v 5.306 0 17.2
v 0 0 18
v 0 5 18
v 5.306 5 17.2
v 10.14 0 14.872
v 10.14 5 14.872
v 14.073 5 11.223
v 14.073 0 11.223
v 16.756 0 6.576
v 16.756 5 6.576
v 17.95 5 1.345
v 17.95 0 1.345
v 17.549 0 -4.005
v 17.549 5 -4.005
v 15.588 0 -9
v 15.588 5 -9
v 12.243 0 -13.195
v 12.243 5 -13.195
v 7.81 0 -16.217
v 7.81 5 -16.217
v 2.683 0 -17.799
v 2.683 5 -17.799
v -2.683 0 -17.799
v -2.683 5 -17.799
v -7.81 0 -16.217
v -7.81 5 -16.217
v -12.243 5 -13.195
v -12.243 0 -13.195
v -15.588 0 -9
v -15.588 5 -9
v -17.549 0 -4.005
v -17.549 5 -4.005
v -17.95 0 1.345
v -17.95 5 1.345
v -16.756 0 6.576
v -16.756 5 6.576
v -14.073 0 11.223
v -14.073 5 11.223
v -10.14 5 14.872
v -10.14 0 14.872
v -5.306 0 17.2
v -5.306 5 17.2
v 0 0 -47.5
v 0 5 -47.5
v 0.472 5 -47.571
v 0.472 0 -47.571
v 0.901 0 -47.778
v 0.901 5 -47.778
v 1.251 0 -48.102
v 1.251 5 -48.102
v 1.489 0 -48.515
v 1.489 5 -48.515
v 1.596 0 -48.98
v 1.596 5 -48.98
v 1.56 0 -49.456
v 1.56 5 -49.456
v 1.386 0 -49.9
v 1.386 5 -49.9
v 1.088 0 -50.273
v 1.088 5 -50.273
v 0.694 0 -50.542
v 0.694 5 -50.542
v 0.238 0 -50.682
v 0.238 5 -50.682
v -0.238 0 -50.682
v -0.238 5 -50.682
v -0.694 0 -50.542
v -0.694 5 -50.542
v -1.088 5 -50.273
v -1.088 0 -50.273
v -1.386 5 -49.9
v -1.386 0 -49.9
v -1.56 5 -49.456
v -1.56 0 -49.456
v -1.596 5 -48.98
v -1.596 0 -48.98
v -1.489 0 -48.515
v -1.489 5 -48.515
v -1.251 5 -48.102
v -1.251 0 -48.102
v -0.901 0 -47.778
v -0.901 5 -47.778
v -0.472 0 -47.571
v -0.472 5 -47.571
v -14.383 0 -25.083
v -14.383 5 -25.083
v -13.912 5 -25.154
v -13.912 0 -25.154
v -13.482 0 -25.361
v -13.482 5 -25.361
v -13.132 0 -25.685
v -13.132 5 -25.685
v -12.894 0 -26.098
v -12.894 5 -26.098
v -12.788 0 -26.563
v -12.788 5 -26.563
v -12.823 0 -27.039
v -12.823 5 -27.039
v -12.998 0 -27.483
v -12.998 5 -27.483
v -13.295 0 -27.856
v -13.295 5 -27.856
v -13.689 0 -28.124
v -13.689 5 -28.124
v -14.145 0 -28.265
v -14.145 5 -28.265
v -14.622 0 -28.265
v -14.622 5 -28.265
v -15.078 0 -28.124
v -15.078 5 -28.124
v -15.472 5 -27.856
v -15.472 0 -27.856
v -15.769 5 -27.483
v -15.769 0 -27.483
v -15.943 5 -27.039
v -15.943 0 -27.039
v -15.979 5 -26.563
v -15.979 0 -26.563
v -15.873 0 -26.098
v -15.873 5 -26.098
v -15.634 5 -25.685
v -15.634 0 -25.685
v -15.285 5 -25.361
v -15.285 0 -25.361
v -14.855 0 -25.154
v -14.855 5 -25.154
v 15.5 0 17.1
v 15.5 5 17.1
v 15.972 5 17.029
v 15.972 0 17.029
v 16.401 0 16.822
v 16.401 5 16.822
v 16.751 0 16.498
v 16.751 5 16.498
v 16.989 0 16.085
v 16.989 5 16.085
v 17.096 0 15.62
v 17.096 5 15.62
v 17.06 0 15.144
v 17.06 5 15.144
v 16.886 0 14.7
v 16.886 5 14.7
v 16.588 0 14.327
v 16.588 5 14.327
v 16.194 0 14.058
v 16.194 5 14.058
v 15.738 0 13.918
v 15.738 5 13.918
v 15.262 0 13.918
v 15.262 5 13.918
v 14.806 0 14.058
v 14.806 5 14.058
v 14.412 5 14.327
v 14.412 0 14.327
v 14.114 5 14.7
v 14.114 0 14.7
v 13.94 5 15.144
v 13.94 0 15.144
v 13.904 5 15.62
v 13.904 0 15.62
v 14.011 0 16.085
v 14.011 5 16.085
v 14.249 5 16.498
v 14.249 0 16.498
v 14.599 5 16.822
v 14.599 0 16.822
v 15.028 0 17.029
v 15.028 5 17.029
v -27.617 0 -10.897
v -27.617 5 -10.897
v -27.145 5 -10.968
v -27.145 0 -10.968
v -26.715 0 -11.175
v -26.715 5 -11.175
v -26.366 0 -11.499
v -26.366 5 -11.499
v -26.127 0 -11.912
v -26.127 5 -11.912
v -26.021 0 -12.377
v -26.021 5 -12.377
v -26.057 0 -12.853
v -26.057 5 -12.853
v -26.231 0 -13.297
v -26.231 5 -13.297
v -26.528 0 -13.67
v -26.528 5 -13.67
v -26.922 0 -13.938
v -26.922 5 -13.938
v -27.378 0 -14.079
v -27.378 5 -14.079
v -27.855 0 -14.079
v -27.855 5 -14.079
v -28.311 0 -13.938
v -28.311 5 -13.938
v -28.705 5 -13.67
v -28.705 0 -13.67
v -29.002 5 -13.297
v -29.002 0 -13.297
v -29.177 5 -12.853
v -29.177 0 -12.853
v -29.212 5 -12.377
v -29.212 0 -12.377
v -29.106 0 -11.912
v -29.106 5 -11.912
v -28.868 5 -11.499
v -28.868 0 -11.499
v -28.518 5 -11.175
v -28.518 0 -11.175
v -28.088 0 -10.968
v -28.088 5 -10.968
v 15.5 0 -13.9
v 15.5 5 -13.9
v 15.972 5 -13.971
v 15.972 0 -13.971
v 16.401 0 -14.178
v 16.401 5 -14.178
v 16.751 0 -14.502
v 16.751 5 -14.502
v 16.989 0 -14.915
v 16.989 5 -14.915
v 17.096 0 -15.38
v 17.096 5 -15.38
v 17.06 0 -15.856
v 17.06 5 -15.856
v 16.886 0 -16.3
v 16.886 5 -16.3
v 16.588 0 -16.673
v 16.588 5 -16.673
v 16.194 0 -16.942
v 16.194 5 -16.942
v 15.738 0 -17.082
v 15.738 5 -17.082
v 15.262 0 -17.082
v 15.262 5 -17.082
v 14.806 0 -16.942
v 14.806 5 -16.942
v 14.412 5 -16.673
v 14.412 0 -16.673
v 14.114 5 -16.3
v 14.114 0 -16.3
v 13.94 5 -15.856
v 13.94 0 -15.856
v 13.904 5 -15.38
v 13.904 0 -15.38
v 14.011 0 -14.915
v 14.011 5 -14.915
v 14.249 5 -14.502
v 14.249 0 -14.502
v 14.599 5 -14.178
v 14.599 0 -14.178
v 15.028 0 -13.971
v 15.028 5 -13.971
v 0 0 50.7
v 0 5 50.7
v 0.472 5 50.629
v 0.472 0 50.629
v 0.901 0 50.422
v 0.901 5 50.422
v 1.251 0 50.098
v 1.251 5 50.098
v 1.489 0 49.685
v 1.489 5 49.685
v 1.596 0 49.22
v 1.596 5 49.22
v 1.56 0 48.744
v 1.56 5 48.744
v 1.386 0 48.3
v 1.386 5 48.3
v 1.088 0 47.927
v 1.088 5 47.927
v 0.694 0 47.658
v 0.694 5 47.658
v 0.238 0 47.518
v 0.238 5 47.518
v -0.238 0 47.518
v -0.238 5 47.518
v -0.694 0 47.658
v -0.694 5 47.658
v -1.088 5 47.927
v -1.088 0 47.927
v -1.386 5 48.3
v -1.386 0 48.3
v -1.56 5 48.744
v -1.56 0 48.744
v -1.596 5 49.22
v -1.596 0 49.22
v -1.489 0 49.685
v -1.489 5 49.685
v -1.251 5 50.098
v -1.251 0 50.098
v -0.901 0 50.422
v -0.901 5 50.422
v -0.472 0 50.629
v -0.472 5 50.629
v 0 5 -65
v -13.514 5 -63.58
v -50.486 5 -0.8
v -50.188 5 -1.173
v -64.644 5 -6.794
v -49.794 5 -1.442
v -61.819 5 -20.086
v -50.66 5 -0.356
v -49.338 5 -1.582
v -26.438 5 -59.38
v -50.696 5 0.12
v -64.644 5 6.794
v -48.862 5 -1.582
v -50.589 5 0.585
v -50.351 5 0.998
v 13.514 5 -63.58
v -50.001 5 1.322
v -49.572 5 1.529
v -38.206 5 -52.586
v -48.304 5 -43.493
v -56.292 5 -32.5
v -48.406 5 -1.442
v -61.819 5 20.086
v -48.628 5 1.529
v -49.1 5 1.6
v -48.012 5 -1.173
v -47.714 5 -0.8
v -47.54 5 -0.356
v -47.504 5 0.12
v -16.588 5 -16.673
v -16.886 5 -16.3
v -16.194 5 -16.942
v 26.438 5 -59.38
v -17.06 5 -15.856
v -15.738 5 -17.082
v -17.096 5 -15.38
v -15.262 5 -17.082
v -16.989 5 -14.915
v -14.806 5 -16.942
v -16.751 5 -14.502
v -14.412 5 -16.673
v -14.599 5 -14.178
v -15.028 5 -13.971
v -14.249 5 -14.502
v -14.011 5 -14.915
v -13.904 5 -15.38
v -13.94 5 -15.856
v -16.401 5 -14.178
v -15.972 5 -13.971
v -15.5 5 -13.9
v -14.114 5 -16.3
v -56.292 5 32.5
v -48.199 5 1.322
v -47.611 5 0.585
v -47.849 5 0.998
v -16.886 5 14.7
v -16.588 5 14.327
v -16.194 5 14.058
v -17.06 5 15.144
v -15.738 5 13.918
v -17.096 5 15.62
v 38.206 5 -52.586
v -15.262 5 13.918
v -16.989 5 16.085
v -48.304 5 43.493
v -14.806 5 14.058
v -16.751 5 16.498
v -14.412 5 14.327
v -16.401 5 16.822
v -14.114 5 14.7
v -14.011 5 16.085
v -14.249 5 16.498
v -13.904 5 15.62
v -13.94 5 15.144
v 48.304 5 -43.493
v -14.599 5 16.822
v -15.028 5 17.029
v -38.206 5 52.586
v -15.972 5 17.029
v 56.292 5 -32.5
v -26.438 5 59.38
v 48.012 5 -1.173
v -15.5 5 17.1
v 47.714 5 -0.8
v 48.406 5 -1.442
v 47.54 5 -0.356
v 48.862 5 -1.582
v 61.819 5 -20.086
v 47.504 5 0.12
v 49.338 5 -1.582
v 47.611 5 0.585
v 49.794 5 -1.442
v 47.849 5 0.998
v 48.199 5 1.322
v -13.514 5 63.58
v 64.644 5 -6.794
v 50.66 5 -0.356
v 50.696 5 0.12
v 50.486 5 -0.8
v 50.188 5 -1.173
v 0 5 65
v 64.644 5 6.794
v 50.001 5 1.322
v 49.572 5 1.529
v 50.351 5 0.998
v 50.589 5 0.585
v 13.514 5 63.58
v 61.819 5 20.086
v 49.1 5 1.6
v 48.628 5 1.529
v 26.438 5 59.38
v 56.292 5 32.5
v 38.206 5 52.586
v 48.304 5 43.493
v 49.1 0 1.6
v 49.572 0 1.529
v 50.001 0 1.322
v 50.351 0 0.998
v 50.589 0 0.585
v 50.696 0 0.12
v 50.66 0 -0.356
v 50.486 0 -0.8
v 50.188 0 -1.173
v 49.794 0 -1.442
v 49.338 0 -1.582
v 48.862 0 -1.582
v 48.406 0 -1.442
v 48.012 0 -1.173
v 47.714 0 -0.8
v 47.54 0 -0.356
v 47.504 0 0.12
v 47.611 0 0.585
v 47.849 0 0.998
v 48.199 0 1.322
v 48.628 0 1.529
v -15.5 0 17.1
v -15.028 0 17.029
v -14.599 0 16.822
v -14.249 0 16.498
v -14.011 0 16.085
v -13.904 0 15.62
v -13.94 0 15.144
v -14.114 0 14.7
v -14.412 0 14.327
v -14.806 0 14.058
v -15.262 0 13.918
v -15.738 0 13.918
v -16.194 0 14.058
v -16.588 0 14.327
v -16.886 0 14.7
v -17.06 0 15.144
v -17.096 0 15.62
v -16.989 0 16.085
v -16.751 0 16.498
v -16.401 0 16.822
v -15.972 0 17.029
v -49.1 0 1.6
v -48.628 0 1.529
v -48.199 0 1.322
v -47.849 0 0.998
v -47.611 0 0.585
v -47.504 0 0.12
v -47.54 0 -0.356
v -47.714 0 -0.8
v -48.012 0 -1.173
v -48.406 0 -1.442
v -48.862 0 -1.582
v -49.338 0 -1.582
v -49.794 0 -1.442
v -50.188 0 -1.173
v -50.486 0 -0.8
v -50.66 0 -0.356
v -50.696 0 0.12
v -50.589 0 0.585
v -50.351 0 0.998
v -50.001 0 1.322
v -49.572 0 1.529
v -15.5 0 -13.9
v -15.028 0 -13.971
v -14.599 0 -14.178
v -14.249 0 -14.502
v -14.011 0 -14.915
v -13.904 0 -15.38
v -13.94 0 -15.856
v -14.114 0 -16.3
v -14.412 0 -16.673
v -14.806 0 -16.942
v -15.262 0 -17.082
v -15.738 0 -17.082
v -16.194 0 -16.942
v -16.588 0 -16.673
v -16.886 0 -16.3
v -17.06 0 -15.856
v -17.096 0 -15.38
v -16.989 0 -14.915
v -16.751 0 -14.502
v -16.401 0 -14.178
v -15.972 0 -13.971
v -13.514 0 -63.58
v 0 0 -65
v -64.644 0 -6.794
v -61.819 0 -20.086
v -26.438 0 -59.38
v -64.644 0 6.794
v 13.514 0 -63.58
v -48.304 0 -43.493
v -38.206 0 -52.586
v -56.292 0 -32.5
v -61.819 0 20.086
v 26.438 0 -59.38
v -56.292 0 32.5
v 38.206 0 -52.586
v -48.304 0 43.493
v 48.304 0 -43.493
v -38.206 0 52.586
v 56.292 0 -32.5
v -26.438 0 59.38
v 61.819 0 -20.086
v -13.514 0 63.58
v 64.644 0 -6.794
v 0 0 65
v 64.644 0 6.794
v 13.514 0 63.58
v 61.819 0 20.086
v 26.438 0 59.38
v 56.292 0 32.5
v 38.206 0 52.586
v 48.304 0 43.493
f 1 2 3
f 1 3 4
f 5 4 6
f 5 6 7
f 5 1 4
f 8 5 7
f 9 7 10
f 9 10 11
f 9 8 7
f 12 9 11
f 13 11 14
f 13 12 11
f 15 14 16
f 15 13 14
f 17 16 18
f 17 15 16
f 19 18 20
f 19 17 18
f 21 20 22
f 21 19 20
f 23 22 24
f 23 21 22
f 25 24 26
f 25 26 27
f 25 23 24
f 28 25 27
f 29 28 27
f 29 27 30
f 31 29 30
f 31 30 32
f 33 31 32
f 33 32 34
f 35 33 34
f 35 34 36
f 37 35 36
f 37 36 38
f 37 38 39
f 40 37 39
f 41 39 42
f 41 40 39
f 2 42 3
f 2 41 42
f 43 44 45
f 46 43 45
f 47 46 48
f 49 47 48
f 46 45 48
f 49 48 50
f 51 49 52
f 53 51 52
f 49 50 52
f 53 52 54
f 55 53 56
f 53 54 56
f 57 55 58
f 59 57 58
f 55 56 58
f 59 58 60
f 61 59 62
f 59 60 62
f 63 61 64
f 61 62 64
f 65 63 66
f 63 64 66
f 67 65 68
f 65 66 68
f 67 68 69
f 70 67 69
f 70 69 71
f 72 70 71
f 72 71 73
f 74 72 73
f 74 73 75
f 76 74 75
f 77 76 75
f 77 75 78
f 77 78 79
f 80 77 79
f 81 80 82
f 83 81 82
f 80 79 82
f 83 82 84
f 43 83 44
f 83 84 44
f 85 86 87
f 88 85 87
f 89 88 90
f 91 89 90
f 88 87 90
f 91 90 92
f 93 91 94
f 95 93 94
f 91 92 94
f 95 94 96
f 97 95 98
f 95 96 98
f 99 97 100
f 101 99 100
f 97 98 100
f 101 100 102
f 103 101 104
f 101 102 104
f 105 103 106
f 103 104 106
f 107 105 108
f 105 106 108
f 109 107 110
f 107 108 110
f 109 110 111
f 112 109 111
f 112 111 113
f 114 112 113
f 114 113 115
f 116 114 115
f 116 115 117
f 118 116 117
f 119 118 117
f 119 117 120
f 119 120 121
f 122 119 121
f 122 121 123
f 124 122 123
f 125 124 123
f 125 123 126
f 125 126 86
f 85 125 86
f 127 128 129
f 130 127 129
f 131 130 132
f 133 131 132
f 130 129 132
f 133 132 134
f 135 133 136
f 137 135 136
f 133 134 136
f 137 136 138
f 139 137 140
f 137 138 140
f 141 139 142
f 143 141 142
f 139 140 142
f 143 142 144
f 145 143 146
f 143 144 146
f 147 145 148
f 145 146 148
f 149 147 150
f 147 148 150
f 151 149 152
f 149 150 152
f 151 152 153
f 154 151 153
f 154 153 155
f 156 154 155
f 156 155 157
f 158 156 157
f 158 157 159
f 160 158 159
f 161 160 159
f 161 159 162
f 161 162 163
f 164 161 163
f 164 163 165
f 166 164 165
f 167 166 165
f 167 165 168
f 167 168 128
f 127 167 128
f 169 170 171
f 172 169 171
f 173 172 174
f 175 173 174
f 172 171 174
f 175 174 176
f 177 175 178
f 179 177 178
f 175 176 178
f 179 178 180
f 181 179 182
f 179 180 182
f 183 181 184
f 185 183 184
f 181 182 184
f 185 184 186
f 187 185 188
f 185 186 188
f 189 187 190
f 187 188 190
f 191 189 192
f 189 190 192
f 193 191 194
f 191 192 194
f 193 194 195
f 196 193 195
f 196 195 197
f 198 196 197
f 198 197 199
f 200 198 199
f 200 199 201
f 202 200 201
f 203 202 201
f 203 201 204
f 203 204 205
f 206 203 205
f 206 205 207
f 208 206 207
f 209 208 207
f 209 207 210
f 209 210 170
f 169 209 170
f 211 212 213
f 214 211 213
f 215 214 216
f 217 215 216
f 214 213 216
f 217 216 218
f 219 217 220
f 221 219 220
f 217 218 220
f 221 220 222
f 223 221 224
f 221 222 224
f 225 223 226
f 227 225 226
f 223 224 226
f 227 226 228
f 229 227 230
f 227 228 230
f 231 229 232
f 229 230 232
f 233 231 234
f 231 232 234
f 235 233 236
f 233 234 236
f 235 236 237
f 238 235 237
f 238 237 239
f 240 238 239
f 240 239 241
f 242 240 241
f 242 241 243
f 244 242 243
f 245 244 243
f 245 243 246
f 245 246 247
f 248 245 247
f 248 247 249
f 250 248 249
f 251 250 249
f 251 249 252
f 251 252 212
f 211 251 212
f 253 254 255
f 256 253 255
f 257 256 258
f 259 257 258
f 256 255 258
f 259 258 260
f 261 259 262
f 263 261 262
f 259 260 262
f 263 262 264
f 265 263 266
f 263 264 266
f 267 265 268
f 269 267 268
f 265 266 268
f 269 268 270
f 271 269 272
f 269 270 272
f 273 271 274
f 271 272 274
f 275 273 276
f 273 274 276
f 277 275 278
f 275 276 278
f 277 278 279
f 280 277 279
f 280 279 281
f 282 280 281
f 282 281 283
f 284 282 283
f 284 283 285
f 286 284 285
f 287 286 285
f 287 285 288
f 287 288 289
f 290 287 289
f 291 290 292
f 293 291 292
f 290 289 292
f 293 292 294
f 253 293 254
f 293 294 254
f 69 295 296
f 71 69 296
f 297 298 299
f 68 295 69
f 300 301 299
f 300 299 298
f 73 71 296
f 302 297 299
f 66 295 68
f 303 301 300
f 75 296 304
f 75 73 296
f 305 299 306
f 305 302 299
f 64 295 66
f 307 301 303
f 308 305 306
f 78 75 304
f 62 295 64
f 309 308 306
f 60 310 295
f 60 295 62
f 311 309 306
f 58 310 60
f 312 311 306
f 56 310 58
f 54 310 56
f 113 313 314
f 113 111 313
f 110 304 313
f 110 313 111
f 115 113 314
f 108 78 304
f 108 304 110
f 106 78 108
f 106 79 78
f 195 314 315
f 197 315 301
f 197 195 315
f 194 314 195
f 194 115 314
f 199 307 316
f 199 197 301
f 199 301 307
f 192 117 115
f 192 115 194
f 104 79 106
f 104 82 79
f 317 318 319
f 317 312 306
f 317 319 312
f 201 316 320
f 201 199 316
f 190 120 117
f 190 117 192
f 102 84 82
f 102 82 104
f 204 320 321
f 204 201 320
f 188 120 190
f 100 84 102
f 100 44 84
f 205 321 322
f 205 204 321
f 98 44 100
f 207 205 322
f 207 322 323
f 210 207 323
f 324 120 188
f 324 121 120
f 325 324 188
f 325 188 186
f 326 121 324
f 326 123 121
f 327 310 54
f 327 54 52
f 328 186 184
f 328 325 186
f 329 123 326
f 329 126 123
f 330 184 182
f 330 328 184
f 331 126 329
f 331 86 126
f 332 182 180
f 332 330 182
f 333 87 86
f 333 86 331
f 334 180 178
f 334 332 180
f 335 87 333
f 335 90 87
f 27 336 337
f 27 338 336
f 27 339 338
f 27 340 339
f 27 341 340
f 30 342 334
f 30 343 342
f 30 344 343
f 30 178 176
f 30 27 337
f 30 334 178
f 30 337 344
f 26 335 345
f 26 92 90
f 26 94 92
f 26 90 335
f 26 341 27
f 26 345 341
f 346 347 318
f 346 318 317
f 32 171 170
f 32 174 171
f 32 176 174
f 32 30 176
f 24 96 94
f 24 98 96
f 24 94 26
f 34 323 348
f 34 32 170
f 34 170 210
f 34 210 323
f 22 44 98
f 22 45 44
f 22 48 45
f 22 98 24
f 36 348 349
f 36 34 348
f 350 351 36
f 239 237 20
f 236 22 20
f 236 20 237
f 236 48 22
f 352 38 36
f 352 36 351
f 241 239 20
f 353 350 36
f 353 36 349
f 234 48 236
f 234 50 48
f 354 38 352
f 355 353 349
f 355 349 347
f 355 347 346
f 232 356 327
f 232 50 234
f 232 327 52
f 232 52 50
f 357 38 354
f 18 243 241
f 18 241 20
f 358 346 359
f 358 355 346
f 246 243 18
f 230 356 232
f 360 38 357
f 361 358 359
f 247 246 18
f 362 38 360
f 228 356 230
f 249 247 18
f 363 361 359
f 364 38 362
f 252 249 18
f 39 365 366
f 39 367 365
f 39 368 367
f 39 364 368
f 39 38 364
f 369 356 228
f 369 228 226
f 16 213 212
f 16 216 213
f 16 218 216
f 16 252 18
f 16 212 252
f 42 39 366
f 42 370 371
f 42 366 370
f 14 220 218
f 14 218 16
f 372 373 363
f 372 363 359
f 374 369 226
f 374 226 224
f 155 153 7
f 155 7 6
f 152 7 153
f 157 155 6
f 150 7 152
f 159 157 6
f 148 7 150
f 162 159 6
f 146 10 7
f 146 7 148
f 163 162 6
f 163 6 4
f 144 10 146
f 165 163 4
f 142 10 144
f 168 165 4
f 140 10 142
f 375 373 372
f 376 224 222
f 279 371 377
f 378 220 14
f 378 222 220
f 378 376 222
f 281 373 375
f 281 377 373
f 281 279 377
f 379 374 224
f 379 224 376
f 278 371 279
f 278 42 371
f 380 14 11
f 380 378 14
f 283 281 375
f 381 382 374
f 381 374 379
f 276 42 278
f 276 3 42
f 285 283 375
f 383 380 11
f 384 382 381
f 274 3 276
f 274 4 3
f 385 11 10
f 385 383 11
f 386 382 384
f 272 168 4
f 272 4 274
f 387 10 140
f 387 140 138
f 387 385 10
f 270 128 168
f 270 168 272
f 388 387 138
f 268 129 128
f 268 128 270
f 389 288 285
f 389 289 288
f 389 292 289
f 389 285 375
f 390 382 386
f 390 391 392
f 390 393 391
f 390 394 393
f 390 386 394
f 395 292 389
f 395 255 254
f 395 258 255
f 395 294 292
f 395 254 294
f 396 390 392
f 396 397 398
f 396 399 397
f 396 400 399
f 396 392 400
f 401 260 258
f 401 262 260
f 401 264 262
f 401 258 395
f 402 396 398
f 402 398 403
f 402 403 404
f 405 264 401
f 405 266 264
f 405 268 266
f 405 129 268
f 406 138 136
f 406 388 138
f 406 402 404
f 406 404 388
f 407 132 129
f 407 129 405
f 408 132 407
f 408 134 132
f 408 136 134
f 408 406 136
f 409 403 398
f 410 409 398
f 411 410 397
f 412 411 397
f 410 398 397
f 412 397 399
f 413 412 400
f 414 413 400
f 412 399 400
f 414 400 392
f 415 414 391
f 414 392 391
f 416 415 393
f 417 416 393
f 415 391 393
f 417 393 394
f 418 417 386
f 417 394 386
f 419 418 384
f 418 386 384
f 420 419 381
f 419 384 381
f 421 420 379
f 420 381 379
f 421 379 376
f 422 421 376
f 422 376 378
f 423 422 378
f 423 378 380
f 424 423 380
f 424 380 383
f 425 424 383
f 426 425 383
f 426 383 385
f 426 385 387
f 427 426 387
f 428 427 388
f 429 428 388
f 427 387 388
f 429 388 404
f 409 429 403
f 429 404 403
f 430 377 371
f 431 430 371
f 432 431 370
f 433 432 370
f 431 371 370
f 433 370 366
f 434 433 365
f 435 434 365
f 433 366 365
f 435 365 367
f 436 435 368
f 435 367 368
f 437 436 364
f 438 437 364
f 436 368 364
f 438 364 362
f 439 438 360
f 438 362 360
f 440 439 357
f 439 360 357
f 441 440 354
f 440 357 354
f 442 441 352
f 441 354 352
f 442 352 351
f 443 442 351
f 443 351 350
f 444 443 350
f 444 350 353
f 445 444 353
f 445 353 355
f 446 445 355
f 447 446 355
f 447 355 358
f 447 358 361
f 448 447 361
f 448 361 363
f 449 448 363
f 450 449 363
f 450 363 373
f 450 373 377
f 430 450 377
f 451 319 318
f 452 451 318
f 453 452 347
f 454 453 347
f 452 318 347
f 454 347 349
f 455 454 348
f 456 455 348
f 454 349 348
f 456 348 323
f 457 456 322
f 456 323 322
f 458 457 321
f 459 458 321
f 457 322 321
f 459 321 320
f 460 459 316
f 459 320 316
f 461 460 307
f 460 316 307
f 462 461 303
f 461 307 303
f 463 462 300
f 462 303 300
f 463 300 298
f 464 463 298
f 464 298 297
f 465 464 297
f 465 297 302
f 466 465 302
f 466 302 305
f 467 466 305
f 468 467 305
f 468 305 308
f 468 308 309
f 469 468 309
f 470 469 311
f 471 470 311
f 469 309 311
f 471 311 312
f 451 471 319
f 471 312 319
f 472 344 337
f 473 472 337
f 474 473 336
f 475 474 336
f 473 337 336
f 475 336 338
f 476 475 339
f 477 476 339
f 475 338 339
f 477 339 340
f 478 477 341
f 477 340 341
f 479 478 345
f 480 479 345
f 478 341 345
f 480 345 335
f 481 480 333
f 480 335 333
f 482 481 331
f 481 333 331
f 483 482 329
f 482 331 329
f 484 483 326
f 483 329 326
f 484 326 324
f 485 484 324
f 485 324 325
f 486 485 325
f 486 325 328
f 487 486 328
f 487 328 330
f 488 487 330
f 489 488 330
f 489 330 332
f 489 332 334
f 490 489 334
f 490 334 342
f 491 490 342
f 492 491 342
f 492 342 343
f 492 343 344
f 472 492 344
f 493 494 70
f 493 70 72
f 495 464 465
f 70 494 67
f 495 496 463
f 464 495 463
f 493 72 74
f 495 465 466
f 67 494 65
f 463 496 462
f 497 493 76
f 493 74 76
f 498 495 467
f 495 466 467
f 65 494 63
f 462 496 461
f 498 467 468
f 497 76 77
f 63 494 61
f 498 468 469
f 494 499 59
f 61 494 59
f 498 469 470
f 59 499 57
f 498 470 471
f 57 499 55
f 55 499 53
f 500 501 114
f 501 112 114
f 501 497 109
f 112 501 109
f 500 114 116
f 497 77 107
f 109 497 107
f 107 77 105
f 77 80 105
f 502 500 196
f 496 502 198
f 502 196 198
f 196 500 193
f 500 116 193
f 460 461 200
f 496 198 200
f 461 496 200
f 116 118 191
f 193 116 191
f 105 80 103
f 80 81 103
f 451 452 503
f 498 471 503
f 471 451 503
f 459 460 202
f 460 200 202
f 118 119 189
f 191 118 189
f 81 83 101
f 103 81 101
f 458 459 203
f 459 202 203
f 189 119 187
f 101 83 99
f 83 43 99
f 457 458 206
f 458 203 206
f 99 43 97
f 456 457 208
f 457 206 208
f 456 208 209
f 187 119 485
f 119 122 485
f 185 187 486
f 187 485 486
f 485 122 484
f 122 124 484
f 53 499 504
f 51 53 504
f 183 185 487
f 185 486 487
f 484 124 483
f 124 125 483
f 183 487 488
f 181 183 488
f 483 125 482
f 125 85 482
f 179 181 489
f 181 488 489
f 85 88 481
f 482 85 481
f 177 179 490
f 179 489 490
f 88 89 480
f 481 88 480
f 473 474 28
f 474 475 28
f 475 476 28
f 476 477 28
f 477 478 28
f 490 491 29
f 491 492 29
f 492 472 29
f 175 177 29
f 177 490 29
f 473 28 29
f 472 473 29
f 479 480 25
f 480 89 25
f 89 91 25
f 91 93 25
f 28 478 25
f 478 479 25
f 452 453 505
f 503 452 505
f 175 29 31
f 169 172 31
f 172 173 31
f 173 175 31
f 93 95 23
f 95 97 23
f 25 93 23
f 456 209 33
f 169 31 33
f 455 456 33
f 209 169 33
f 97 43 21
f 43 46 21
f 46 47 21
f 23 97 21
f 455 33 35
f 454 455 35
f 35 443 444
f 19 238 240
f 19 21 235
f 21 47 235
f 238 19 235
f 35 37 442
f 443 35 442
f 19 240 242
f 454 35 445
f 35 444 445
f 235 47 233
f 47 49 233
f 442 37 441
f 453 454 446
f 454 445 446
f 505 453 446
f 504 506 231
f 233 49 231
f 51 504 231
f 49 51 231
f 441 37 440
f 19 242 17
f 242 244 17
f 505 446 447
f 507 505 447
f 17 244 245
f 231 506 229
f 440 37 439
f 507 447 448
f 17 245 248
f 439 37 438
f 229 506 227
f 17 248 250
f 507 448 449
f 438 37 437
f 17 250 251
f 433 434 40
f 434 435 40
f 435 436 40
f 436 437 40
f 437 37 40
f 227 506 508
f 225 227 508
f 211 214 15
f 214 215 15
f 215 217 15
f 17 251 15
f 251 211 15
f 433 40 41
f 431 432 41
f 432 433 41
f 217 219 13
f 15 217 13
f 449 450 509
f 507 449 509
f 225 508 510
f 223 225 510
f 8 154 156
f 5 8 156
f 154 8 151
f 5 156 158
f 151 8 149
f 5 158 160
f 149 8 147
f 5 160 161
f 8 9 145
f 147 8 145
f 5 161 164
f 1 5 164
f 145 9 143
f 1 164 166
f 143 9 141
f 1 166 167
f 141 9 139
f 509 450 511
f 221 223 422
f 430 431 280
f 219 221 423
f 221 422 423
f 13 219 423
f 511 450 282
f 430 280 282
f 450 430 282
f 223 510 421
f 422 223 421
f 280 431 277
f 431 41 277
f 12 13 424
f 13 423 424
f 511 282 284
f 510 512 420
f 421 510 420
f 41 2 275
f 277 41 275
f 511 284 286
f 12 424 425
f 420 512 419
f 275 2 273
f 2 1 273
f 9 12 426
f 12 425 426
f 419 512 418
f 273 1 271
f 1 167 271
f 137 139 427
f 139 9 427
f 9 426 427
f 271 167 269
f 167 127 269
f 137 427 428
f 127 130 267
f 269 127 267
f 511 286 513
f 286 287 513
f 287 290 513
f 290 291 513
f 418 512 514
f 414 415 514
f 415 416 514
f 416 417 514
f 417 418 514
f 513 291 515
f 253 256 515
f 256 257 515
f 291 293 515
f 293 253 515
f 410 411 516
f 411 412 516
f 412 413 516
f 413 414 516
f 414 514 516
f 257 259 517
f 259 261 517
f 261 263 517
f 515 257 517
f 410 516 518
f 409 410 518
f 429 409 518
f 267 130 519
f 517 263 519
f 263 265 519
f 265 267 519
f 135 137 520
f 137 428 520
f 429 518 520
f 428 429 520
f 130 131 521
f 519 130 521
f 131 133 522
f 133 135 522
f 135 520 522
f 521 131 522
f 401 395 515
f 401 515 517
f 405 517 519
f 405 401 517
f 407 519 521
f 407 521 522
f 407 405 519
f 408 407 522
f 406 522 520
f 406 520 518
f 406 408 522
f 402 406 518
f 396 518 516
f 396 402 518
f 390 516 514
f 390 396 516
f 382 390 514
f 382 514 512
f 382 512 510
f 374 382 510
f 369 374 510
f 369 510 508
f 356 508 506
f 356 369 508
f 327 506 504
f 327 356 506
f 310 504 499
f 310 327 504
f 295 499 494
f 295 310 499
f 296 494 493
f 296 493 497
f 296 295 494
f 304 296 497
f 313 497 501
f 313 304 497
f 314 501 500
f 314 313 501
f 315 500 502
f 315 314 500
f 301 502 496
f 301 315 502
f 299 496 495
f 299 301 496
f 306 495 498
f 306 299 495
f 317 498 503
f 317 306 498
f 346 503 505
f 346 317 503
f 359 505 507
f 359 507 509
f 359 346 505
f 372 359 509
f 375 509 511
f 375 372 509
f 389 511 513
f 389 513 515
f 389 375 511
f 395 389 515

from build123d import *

# Parameters (mm, degrees)
SKETCH_2_W          = 46
SKETCH_2_H          = 46
SKETCH_2_R          = 18
EXTRUDE_1_DEPTH     = 5
FILLET_1_R          = 5.5
SKETCH_3_R          = 1.6
CUT_EXTRUDE_1_DEPTH = 33.908965344
SKETCH_4_R          = 65
SKETCH_4_R_2        = 1.6
SKETCH_4_R_3        = 18
EXTRUDE_2_DEPTH     = 5
SKETCH_7_R          = 1.6
CUT_EXTRUDE_3_DEPTH = 93.059763198


with BuildPart() as part:
    # 草图2 → 凸台-拉伸1 (new body)
    with BuildSketch(Plane(origin=(0, 0, 0), x_dir=(1, 0, 0), z_dir=(0, 1, 0))):
        Rectangle(SKETCH_2_W, SKETCH_2_H)
        with Locations(Location((0, 0, 0), (0, 0, 270))):
            Circle(SKETCH_2_R, mode=Mode.SUBTRACT)
    extrude(amount=EXTRUDE_1_DEPTH)

    # 圆角1
    fillet_1_edges = [part.edges().sort_by_distance(p)[0] for p in [
        (23, 2.5, 23),
        (-23, 2.5, 23),
        (-23, 2.5, -23),
        (23, 2.5, -23),
    ]]
    fillet(fillet_1_edges, radius=FILLET_1_R)

    # 草图3 → 切除-拉伸1 (cut, through all)
    with BuildSketch(Plane(origin=(0, 5, 0), x_dir=(1, 0, 0), z_dir=(0, 1, 0))):
        with Locations(Location((-15.5, 15.5, 0), (0, 0, 270))):
            Circle(SKETCH_3_R)
        with Locations(Location((15.5, 15.5, 0), (0, 0, 270))):
            Circle(SKETCH_3_R)
        with Locations(Location((-15.5, -15.5, 0), (0, 0, 270))):
            Circle(SKETCH_3_R)
        with Locations(Location((15.5, -15.5, 0), (0, 0, 270))):
            Circle(SKETCH_3_R)
    extrude(amount=-CUT_EXTRUDE_1_DEPTH, mode=Mode.SUBTRACT)

    # 草图4 → 凸台-拉伸2 (add)
    # profile 1 of 2: a face of its own
    with BuildSketch(Plane(origin=(0, 5, 0), x_dir=(1, 0, 0), z_dir=(0, 1, 0))):
        with Locations(Location((0, 0, 0), (0, 0, 270))):
            Circle(SKETCH_4_R)
        with Locations(Location((-49.1, 0, 0), (0, 0, 270))):
            Circle(SKETCH_4_R_2, mode=Mode.SUBTRACT)
        with Locations(Location((0, -49.1, 0), (0, 0, 270))):
            Circle(SKETCH_4_R_2, mode=Mode.SUBTRACT)
        with Locations(Location((49.1, 0, 0), (0, 0, 270))):
            Circle(SKETCH_4_R_2, mode=Mode.SUBTRACT)
        with Locations(Location((0, 49.1, 0), (0, 0, 270))):
            Circle(SKETCH_4_R_2, mode=Mode.SUBTRACT)
        with BuildLine():
            Line((-17.5, -23), (17.5, -23))
            ThreePointArc((17.5, -23), (21.389087297, -21.389087297), (23, -17.5))
            Line((23, -17.5), (23, 17.5))
            ThreePointArc((23, 17.5), (21.389087297, 21.389087297), (17.5, 23))
            Line((17.5, 23), (-17.5, 23))
            ThreePointArc((-17.5, 23), (-21.389087297, 21.389087297), (-23, 17.5))
            Line((-23, 17.5), (-23, -17.5))
            ThreePointArc((-23, -17.5), (-21.389087297, -21.389087297), (-17.5, -23))
        make_face(mode=Mode.SUBTRACT)
    # profile 2 of 2: a face of its own
    with BuildSketch(Plane(origin=(0, 5, 0), x_dir=(1, 0, 0), z_dir=(0, 1, 0))):
        with BuildLine():
            ThreePointArc((-23, -17.5), (-21.389087297, -21.389087297), (-17.5, -23))
            Line((-17.5, -23), (17.5, -23))
            ThreePointArc((17.5, -23), (21.389087297, -21.389087297), (23, -17.5))
            Line((23, -17.5), (23, 17.5))
            ThreePointArc((23, 17.5), (21.389087297, 21.389087297), (17.5, 23))
            Line((17.5, 23), (-17.5, 23))
            ThreePointArc((-17.5, 23), (-21.389087297, 21.389087297), (-23, 17.5))
            Line((-23, 17.5), (-23, -17.5))
        make_face()
        with Locations(Location((15.5, 15.5, 0), (0, 0, 270))):
            Circle(SKETCH_4_R_2, mode=Mode.SUBTRACT)
        with Locations(Location((-15.5, -15.5, 0), (0, 0, 270))):
            Circle(SKETCH_4_R_2, mode=Mode.SUBTRACT)
        with Locations(Location((0, 0, 0), (0, 0, 270))):
            Circle(SKETCH_4_R_3, mode=Mode.SUBTRACT)
        with Locations(Location((-15.5, 15.5, 0), (0, 0, 270))):
            Circle(SKETCH_4_R_2, mode=Mode.SUBTRACT)
        with Locations(Location((15.5, -15.5, 0), (0, 0, 270))):
            Circle(SKETCH_4_R_2, mode=Mode.SUBTRACT)
    extrude(amount=-EXTRUDE_2_DEPTH)

    # 草图7 → 切除-拉伸3 (cut, through all)
    with BuildSketch(Plane(origin=(0, 5, 0), x_dir=(1, 0, 0), z_dir=(0, 1, 0))):
        with Locations(Location((-14.383356955, 26.682742705, 0), (0, 0, 270))):
            Circle(SKETCH_7_R)
        with Locations(Location((-27.616643045, 12.496829297, 0), (0, 0, 270))):
            Circle(SKETCH_7_R)
    extrude(amount=-CUT_EXTRUDE_3_DEPTH, mode=Mode.SUBTRACT)


solid = part.part
